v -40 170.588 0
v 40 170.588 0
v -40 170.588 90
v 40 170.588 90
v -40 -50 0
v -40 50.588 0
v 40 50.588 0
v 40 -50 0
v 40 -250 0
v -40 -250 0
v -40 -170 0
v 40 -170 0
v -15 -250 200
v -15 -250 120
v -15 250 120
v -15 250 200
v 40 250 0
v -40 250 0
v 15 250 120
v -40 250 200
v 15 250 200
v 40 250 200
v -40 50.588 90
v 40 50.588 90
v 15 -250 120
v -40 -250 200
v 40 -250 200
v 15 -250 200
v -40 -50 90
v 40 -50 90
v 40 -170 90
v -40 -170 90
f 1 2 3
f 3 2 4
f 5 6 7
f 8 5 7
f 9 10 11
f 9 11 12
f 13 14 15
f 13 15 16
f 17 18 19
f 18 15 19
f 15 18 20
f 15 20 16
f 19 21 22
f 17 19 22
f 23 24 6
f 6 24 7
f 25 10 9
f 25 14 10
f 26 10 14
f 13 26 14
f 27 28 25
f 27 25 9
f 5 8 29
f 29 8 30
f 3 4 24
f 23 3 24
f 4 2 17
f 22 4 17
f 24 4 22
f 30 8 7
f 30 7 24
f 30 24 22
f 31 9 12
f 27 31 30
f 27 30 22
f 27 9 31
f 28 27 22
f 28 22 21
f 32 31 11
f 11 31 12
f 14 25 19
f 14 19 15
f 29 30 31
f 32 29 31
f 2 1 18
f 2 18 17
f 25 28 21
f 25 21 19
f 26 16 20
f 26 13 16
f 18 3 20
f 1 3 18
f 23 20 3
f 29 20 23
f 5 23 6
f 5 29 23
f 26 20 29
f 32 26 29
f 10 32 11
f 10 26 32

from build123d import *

# Parameters (mm, degrees)
F1_DEPTH = 250
F3_DEPTH = 80.001


with BuildPart() as f1:
    # F0 (on Front) → F1 (new body, symmetric)
    with BuildSketch(Plane.XZ):
        Polygon((-40, 0), (40, 0), (40, 120), (40, 200), (15, 200), (15, 120), (-15, 120), (-15, 200), (-40, 200), (-40, 120), align=None)
    extrude(amount=F1_DEPTH, both=True)

    # F2 (on face) → F3 (cut, through all)
    with BuildSketch(Plane.YZ.offset(40)):
        Polygon((-170, 72.962383), (-170, 0), (-50, 0), (-50, 90), (-170, 90), align=None)
        Polygon((50.587727, 0), (170.587727, 0), (170.587727, 72.962383), (170.587727, 90), (50.587727, 90), align=None)
    extrude(amount=-F3_DEPTH, mode=Mode.SUBTRACT)


solid = f1.part
